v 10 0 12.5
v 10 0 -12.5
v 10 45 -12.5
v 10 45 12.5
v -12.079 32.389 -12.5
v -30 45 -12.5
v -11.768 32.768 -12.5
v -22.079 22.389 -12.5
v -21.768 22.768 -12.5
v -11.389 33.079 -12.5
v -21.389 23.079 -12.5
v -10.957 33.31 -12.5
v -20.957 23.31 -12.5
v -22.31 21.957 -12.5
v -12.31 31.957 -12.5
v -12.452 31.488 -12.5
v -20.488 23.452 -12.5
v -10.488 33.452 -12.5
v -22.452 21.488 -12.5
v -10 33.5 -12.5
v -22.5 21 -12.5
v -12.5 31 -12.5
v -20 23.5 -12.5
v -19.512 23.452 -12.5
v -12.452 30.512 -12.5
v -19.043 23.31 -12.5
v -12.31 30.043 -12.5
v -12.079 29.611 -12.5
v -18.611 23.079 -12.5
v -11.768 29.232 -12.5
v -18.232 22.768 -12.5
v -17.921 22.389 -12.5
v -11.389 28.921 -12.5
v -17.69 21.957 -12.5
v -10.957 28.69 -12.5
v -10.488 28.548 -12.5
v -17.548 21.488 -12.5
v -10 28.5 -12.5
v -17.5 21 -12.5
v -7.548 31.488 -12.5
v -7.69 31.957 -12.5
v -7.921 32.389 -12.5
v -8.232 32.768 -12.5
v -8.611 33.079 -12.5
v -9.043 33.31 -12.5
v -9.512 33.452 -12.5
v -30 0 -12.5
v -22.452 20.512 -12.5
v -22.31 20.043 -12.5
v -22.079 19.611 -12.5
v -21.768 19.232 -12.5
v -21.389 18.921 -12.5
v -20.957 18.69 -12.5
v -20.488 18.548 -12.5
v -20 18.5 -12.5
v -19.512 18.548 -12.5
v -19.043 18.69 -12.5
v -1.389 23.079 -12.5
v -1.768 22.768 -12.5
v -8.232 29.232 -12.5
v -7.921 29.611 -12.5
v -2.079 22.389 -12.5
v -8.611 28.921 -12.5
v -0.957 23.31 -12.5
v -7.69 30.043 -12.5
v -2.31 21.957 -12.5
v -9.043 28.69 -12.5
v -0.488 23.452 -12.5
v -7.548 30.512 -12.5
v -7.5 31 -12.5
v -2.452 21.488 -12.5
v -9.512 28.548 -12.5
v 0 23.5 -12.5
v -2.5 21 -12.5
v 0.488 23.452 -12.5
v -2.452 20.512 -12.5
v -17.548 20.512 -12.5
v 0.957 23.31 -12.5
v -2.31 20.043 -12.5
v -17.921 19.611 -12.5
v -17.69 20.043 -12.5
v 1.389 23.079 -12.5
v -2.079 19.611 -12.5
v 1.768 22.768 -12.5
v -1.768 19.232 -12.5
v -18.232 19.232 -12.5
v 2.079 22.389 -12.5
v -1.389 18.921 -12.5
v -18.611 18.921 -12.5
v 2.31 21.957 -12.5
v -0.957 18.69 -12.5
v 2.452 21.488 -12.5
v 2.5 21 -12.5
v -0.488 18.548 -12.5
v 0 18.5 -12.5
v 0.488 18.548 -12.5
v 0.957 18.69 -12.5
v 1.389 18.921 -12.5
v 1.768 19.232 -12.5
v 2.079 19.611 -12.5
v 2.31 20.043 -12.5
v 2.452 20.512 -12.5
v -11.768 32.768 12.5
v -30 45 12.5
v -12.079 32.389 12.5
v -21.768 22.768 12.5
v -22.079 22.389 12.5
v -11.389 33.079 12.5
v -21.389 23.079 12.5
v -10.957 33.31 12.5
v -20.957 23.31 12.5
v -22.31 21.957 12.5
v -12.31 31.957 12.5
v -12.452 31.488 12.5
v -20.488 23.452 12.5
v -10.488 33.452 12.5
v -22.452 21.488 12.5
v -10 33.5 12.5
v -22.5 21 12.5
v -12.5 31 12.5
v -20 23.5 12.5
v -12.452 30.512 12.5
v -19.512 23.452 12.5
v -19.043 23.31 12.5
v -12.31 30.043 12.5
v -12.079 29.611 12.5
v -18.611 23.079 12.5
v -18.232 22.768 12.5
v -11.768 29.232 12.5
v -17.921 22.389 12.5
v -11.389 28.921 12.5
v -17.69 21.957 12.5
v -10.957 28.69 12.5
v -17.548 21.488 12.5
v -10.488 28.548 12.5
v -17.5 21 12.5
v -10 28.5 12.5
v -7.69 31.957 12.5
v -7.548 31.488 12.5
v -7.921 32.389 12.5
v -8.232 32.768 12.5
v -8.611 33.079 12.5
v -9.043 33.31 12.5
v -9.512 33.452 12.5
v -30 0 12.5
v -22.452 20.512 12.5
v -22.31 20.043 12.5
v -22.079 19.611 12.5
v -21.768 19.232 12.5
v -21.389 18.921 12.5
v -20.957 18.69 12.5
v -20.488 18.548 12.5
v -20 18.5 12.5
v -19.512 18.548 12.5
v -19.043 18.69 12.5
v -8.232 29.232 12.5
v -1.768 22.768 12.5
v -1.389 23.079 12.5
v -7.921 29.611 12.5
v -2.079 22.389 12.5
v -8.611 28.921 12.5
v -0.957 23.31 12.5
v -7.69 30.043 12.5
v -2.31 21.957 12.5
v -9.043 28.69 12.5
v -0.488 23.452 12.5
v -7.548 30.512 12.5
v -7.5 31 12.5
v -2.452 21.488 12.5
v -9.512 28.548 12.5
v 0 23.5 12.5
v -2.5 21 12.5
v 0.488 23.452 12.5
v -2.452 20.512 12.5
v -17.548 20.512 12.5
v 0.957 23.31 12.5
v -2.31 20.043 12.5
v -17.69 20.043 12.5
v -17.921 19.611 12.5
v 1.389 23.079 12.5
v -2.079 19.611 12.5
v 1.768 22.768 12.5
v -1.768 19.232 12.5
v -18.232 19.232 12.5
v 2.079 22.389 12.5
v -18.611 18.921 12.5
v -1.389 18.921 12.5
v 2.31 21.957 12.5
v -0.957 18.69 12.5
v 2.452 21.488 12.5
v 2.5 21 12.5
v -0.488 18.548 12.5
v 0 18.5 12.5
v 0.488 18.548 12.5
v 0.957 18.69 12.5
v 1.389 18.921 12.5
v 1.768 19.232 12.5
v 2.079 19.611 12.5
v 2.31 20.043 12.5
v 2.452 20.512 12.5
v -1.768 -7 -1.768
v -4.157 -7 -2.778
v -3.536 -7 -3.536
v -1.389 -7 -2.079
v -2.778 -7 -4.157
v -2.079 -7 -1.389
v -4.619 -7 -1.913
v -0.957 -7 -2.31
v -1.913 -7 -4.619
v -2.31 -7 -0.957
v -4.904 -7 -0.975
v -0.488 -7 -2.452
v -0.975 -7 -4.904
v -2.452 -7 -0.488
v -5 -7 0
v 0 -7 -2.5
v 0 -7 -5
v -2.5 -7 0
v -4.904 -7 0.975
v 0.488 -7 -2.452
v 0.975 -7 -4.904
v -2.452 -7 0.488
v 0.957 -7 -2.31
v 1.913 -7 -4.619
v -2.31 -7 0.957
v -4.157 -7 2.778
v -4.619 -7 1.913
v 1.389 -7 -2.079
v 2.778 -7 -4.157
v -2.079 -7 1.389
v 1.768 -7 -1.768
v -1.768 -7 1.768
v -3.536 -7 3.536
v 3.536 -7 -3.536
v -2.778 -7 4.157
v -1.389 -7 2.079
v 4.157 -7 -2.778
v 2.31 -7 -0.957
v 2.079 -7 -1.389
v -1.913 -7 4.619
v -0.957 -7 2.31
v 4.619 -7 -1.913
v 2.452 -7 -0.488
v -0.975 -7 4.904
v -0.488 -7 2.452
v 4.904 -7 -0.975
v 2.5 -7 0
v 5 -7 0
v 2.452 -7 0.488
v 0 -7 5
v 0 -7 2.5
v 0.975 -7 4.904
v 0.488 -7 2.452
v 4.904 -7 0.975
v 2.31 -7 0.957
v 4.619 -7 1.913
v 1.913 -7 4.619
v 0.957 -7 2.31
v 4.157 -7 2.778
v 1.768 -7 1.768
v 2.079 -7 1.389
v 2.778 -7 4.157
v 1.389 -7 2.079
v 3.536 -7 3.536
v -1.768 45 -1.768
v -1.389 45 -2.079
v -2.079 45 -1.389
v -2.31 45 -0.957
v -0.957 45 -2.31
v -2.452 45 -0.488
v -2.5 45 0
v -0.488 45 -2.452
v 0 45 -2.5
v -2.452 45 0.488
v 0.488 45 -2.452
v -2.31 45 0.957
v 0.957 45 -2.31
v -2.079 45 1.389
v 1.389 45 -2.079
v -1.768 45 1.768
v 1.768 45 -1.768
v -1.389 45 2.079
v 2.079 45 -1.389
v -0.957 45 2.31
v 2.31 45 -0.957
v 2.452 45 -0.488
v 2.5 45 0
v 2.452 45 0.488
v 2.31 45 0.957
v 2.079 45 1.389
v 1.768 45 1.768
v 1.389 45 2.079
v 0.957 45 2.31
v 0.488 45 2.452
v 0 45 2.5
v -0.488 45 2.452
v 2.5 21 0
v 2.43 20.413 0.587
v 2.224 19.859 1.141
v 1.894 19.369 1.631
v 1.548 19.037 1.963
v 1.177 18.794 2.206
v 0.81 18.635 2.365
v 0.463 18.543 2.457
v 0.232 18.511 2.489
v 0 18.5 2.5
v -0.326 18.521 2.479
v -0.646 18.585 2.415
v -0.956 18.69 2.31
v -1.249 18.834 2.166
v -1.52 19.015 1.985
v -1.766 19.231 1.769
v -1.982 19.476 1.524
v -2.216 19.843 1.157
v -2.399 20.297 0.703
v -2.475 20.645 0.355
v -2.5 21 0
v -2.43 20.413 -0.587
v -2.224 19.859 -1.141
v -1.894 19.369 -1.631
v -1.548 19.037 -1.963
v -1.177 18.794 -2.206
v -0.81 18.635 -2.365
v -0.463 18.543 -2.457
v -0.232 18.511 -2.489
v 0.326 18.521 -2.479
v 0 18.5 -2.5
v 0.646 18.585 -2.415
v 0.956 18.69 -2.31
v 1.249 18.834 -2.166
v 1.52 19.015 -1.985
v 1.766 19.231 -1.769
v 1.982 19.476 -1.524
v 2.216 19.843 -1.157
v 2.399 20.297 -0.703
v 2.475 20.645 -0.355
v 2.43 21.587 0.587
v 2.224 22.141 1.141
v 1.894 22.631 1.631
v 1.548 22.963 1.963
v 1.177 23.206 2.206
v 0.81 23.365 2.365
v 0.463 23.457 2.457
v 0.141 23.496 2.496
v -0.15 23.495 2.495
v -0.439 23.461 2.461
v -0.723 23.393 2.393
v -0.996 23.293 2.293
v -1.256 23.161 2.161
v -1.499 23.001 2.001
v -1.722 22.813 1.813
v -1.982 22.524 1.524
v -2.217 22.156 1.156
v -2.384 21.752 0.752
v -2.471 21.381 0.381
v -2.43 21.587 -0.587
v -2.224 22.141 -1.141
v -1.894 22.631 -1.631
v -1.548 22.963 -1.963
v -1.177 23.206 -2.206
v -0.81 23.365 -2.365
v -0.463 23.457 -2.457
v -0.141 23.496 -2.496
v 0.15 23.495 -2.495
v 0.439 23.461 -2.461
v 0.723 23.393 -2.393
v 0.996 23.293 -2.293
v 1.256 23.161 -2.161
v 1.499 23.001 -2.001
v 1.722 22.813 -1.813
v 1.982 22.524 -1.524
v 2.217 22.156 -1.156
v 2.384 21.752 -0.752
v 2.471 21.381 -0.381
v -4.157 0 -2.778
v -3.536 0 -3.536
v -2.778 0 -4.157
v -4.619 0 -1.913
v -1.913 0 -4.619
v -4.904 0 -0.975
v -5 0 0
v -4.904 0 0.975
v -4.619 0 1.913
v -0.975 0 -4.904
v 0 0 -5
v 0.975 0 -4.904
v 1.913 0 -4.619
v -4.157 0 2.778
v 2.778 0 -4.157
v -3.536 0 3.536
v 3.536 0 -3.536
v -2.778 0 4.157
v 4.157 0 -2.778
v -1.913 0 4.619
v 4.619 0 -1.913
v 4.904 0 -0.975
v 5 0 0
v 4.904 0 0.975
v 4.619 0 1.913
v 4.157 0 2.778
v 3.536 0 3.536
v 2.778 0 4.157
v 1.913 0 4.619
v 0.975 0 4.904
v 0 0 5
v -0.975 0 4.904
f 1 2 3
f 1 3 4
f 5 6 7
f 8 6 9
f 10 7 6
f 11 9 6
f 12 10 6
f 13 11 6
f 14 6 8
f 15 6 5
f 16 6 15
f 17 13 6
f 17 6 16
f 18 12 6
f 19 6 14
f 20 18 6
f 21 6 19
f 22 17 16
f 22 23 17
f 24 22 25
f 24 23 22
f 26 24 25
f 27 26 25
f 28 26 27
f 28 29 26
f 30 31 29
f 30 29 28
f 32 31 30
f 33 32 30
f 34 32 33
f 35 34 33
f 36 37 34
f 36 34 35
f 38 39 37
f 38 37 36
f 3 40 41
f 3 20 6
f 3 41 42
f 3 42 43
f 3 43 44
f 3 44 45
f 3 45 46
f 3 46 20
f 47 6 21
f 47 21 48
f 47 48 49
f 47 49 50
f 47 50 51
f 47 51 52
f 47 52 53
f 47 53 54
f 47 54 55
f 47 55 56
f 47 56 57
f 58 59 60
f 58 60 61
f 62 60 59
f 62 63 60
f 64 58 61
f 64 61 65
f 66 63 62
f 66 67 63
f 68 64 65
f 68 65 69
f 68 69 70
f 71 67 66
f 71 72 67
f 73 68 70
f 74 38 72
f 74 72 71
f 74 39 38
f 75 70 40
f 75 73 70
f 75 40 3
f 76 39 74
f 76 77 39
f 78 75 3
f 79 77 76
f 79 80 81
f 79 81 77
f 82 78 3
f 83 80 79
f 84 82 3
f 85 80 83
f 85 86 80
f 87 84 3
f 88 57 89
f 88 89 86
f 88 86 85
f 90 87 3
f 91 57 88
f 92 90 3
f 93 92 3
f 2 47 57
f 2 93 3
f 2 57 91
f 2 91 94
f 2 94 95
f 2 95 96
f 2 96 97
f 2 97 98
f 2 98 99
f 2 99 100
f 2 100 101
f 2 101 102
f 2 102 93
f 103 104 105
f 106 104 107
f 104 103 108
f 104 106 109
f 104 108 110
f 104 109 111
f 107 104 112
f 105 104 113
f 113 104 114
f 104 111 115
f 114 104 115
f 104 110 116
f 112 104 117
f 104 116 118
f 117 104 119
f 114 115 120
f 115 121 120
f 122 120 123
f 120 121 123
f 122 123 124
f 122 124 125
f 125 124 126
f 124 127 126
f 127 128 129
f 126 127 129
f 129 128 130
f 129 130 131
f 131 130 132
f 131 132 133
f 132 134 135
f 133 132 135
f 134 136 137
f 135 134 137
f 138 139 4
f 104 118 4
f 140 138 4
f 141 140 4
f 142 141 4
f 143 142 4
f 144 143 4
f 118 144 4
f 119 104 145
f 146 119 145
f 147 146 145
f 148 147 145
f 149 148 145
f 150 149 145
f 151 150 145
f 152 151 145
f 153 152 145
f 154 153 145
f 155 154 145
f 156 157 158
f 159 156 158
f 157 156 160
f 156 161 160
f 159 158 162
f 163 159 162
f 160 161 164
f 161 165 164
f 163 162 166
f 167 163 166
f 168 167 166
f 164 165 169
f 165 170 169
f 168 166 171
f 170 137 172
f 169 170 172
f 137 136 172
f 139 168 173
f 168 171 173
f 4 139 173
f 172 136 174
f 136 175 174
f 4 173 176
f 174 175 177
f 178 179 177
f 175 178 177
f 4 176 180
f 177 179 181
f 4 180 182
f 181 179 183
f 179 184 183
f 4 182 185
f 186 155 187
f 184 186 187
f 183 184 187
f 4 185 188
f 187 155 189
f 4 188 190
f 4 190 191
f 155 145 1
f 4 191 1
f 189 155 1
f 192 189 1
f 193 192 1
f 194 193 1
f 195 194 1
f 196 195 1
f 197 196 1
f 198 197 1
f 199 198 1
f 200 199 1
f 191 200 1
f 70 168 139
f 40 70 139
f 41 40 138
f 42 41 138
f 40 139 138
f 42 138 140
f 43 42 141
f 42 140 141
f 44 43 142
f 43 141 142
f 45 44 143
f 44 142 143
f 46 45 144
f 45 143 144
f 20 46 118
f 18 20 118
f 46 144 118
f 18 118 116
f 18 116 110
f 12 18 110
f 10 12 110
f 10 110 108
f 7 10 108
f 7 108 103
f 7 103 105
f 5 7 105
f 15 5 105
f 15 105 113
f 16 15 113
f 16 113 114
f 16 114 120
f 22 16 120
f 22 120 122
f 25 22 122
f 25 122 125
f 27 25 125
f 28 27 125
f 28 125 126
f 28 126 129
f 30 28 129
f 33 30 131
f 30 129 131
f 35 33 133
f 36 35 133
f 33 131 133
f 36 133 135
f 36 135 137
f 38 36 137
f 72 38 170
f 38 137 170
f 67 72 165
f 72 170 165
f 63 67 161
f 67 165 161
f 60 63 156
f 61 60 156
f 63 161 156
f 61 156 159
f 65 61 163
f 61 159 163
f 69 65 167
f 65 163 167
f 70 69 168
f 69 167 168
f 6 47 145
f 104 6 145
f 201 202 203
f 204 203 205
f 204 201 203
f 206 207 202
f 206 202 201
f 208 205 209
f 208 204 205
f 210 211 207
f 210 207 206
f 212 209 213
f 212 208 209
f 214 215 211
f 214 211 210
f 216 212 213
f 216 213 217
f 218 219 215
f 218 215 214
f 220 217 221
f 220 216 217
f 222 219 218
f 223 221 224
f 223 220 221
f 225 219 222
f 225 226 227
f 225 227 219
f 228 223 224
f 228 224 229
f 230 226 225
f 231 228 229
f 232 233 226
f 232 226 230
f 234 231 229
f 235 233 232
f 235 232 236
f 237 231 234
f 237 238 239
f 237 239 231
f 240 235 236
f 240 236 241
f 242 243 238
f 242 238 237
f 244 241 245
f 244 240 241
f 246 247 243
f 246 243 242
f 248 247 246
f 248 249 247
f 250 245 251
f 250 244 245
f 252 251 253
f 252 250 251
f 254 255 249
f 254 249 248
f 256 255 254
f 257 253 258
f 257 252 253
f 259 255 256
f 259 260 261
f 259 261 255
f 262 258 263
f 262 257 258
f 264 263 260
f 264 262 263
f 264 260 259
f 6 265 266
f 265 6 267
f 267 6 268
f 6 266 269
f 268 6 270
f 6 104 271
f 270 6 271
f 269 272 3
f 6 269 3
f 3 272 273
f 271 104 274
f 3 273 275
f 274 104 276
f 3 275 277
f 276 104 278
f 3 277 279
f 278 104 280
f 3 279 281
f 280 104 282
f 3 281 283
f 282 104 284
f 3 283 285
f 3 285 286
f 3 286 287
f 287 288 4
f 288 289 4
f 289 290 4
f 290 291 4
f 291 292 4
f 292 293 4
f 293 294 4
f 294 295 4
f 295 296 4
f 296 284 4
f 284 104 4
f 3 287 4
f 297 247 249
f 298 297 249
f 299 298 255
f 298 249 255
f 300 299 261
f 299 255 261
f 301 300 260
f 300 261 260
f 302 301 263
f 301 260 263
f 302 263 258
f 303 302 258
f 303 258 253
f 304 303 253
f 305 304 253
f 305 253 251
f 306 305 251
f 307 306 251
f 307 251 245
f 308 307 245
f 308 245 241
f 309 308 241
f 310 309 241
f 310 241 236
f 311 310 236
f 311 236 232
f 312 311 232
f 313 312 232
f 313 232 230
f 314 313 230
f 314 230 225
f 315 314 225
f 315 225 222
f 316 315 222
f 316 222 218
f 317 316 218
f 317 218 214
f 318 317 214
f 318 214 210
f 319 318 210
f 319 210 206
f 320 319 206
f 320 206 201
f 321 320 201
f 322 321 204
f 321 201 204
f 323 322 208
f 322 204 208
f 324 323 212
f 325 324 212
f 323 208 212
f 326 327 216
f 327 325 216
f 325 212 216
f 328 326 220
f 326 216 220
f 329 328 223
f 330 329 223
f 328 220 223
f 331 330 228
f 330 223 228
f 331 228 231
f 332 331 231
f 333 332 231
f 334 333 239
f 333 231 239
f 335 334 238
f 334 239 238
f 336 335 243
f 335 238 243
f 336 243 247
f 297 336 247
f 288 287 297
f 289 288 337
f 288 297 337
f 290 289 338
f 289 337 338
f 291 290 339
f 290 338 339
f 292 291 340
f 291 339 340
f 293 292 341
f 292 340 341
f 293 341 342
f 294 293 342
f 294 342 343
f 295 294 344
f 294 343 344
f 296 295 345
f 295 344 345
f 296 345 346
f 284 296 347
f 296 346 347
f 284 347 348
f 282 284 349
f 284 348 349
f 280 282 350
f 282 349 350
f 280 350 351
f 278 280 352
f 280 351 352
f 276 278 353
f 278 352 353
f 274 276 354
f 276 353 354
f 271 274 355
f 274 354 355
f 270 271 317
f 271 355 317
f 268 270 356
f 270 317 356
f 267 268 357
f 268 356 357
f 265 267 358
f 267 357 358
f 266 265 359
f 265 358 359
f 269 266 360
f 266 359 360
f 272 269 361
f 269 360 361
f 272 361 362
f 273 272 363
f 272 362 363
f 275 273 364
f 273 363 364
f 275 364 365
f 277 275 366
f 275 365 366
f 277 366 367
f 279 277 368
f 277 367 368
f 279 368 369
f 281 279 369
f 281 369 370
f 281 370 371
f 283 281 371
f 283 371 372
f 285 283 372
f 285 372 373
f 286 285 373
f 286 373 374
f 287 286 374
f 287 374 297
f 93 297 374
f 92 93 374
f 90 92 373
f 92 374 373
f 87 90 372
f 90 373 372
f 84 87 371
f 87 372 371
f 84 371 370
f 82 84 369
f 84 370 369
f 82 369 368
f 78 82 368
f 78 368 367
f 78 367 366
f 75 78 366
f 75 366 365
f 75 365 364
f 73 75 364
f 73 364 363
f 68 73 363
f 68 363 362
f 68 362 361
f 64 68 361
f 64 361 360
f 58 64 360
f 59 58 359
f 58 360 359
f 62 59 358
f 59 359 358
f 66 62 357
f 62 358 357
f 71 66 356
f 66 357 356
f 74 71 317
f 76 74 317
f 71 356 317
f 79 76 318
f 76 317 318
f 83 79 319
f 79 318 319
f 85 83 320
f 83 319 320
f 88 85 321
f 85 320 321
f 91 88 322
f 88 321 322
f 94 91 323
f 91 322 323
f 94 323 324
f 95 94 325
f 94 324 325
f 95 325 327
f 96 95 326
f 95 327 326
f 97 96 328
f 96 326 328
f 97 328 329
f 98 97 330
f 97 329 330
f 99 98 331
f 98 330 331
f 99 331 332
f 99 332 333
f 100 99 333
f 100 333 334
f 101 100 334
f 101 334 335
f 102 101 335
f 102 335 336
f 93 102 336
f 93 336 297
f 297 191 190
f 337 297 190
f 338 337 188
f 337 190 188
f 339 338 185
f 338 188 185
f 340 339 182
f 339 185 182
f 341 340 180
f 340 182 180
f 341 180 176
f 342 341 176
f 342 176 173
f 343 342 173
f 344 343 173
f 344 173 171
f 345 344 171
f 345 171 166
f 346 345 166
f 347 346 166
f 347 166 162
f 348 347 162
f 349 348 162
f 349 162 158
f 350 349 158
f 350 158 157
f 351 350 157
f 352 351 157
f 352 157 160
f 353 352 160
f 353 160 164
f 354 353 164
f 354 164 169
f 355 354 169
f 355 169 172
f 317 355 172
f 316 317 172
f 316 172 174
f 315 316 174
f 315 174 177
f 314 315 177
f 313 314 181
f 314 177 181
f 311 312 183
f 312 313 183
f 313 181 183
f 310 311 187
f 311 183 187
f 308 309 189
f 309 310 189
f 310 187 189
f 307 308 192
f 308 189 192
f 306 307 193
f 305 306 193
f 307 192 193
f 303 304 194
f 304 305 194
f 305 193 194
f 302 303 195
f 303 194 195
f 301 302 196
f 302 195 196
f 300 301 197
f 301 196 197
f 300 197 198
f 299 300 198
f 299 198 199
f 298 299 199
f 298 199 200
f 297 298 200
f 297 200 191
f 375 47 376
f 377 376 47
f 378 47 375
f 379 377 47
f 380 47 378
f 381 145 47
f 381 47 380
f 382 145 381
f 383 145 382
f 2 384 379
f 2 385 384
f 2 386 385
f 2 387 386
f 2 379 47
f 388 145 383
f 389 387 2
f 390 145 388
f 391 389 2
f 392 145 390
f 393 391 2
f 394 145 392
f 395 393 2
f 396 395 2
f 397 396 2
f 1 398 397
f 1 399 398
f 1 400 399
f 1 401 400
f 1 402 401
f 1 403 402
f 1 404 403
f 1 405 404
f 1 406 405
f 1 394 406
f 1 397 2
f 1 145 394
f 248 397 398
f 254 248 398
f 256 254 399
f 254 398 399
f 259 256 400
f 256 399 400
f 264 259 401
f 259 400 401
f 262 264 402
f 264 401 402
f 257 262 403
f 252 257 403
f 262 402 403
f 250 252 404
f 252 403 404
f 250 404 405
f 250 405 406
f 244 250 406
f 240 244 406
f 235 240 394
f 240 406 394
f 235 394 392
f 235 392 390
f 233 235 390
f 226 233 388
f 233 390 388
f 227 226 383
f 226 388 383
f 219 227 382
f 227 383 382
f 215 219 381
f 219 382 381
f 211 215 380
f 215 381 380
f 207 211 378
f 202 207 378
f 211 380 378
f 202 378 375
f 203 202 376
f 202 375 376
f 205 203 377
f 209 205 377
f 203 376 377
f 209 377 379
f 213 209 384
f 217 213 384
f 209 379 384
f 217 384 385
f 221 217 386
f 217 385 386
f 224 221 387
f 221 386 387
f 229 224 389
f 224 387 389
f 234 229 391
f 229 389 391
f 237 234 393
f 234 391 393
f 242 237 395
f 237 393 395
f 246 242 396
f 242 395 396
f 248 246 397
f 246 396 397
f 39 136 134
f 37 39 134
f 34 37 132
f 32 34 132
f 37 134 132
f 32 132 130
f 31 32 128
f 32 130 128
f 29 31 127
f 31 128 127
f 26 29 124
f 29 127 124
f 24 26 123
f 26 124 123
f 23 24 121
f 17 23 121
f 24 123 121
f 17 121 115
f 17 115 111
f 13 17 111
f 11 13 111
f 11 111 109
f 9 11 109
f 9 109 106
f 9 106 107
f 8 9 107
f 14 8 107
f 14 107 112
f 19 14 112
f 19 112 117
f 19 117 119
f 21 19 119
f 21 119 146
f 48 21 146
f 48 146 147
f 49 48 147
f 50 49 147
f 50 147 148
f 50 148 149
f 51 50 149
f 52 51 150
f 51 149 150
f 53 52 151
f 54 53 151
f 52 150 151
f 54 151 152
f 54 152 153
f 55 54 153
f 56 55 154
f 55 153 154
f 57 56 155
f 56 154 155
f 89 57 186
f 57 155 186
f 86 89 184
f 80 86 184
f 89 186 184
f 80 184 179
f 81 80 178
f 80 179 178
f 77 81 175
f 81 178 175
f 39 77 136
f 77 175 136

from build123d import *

# Parameters (mm, degrees)
F0_W          = 40
F0_H          = 25
F1_DEPTH      = 45
F2_R          = 5
F3_DEPTH      = 7
F4_R          = 2.5
F5_DEPTH      = 45.001
F5_DEPTH_BACK = 7.001
F6_R          = 2.5
F7_DEPTH      = 25.001


with BuildPart() as f1:
    # F0 (on Front) → F1 (new body)
    with BuildSketch(Plane.XZ):
        with Locations((-10, 0)):
            Rectangle(F0_W, F0_H)
    extrude(amount=-F1_DEPTH)

    # F2 (on face) → F3 (join)
    with BuildSketch(Plane.XZ):
        Circle(F2_R)
    extrude(amount=F3_DEPTH)

    # F4 (on Front) → F5 (cut, two sides)
    with BuildSketch(Plane.XZ) as f5_sk:
        Circle(F4_R)
    extrude(amount=-F5_DEPTH, mode=Mode.SUBTRACT)
    extrude(f5_sk.sketch, amount=F5_DEPTH_BACK, mode=Mode.SUBTRACT)

    # F6 (on face) → F7 (cut, through all)
    with BuildSketch(Plane.XY.offset(12.5)):
        with Locations((0, 21)):
            Circle(F6_R)
        with Locations((-10, 31)):
            Circle(F6_R)
        with Locations((-20, 21)):
            Circle(F6_R)
    extrude(amount=-F7_DEPTH, mode=Mode.SUBTRACT)


solid = f1.part
